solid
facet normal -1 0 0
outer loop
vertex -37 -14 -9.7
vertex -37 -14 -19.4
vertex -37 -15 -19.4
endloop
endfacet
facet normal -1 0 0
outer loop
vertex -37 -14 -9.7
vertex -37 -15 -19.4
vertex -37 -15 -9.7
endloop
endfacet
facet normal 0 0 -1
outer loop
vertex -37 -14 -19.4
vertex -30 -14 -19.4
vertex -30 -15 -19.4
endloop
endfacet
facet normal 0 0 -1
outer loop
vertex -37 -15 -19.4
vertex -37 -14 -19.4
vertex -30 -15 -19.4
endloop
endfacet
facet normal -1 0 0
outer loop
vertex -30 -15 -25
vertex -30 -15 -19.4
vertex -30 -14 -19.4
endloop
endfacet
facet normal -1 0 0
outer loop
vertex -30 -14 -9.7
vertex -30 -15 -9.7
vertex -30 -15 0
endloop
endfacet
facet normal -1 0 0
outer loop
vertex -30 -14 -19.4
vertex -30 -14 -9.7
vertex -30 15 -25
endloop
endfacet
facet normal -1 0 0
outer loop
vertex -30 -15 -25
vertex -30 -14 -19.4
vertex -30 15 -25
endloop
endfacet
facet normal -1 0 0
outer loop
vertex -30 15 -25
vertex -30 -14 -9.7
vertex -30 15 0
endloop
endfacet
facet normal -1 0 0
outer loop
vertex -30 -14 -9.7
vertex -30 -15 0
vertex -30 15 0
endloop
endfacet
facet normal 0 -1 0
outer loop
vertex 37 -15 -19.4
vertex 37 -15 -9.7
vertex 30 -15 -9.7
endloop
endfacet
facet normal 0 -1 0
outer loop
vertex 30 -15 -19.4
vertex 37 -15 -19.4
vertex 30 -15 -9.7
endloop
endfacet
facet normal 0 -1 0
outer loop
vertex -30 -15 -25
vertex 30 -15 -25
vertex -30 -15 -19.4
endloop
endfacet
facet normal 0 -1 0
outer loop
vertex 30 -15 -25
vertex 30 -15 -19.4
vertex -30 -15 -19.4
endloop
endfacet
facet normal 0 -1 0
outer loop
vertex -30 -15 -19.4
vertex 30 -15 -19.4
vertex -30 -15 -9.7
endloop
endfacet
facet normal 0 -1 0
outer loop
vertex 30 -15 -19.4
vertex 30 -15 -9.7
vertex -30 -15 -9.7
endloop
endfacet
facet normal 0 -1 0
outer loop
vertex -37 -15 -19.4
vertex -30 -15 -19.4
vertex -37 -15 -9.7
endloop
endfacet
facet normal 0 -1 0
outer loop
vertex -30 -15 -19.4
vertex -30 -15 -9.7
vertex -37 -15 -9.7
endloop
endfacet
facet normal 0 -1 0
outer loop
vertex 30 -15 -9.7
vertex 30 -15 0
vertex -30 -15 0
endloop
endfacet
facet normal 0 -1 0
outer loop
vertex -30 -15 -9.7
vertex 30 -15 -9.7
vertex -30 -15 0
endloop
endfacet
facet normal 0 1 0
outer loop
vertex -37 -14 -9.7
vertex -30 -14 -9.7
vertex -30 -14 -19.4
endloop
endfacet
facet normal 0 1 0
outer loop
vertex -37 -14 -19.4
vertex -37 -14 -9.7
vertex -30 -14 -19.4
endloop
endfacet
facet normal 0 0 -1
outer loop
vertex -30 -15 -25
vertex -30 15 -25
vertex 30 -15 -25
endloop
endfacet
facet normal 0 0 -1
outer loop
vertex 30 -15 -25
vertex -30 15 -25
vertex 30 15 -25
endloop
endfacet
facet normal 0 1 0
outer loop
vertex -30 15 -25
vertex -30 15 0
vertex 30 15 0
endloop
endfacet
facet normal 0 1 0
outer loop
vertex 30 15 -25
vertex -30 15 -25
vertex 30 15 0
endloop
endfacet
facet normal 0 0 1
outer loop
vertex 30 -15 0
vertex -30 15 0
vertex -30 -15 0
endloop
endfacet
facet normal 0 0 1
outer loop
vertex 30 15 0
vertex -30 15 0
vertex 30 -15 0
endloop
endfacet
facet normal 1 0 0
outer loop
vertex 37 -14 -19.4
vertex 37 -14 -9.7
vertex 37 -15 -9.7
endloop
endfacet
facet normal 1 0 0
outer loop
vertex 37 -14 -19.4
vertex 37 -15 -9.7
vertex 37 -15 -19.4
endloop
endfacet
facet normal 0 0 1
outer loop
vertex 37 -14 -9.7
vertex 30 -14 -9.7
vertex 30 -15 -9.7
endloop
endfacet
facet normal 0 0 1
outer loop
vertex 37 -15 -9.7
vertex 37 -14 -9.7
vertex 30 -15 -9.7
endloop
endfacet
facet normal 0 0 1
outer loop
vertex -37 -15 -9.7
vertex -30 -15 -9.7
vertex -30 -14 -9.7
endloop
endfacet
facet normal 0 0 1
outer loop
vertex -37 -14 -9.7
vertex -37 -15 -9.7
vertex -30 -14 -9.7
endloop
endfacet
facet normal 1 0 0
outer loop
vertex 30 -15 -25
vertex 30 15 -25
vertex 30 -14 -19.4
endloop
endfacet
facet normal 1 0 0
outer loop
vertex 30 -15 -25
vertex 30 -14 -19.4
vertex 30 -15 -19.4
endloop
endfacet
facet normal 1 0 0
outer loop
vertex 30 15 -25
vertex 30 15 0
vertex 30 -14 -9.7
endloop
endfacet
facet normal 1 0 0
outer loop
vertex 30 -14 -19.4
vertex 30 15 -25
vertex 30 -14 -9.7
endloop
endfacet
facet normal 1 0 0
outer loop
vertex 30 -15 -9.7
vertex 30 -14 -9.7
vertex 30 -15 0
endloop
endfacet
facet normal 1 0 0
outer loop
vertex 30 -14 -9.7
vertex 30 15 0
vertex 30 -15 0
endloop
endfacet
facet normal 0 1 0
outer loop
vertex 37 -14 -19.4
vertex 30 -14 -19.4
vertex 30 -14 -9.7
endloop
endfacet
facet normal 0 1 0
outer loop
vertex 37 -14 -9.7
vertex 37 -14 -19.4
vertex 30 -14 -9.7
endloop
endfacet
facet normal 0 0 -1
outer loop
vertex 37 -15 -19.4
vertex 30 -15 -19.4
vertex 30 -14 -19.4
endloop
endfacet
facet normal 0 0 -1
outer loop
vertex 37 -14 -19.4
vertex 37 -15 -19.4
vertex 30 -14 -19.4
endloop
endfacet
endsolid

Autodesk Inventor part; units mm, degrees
ref_plane "YZ Plane" through (0, 0, 0) normal (1, 0, 0) x (0, 1, 0)
ref_plane "XZ Plane" through (0, 0, 0) normal (0, 1, 0) x (-1, 0, 0)
ref_plane "XY Plane" through (0, 0, 0) normal (0, 0, 1) x (1, 0, 0)
sketch "Skizze1" plane through (0, 0, 0) normal (0, 0, 1) x (1, 0, 0)
  line L0 (30, -15) -> (-30, -15)
  line L1 (-30, -15) -> (-30, 15)
  line L2 (-30, 15) -> (30, 15)
  line L3 (30, 15) -> (30, -15)
  point P0 (0, 0)
  point P1 (-30, 0)
  point P2 (0, 15)
  dimension "d0" = 30
  dimension "d1" = 60
extrude "Extrusion1" add sketch "Skizze1" against normal blind 25
sketch "Skizze4" plane through (30, -15, 0) normal (1, 0, 0) x (0, 0, -1)
  line L0 (0, 0) -> (0, 30) projected
  line L1 (0, 0) -> (25, 0) projected
  line L2 (25, 0) -> (19.4, 0)
  line L3 (9.7, 0) -> (19.4, 0)
  line L4 (19.4, 0) -> (19.4, 1)
  line L5 (19.4, 1) -> (9.7, 1)
  line L6 (9.7, 1) -> (9.7, 0)
  point P0 (0, 15)
extrude "Extrusion3" add sketch "Skizze4" along normal blind 7
mirror "Spiegeln1" about plane through (0, 0, 0) normal (1, 0, 0) of "Extrusion3"
sketch "Skizze5" plane through (30, -14, -9.7) normal (0, 1, 0) x (1, 0, 0)
  line L0 (7, 0) -> (7, 9.7) projected
  line L1 (0, -9.7) -> (0, 15.3) projected
  line L2 (0, -9.7) -> (0, 0) projected
  line L3 (-60, 9.7) -> (-60, 0) projected
  line L4 (-60, 9.7) -> (-67, 9.7) projected
  line L5 (-67, 9.7) -> (-67, 0) projected
  point P0 (-30, -9.7)
  point P1 (3.5, 4.7412)
  point P2 (-63.5, 4.85)
sketch "Skizze6" plane through (-30, 15, 0) normal (0, 1, 0) x (1, 0, 0)
  line L0 (18.8891, 23.5916) -> (66.0849, 23.5916) construction
  line L1 (66.0849, 23.5916) -> (66.0849, 19.2386) construction
  line L2 (66.0849, 19.2386) -> (18.8891, 19.2386) construction
  line L3 (18.8891, 19.2386) -> (18.8891, 23.5916) construction
  point P0 (30, 0)
properties part number "Empfänger" material "Gold"
